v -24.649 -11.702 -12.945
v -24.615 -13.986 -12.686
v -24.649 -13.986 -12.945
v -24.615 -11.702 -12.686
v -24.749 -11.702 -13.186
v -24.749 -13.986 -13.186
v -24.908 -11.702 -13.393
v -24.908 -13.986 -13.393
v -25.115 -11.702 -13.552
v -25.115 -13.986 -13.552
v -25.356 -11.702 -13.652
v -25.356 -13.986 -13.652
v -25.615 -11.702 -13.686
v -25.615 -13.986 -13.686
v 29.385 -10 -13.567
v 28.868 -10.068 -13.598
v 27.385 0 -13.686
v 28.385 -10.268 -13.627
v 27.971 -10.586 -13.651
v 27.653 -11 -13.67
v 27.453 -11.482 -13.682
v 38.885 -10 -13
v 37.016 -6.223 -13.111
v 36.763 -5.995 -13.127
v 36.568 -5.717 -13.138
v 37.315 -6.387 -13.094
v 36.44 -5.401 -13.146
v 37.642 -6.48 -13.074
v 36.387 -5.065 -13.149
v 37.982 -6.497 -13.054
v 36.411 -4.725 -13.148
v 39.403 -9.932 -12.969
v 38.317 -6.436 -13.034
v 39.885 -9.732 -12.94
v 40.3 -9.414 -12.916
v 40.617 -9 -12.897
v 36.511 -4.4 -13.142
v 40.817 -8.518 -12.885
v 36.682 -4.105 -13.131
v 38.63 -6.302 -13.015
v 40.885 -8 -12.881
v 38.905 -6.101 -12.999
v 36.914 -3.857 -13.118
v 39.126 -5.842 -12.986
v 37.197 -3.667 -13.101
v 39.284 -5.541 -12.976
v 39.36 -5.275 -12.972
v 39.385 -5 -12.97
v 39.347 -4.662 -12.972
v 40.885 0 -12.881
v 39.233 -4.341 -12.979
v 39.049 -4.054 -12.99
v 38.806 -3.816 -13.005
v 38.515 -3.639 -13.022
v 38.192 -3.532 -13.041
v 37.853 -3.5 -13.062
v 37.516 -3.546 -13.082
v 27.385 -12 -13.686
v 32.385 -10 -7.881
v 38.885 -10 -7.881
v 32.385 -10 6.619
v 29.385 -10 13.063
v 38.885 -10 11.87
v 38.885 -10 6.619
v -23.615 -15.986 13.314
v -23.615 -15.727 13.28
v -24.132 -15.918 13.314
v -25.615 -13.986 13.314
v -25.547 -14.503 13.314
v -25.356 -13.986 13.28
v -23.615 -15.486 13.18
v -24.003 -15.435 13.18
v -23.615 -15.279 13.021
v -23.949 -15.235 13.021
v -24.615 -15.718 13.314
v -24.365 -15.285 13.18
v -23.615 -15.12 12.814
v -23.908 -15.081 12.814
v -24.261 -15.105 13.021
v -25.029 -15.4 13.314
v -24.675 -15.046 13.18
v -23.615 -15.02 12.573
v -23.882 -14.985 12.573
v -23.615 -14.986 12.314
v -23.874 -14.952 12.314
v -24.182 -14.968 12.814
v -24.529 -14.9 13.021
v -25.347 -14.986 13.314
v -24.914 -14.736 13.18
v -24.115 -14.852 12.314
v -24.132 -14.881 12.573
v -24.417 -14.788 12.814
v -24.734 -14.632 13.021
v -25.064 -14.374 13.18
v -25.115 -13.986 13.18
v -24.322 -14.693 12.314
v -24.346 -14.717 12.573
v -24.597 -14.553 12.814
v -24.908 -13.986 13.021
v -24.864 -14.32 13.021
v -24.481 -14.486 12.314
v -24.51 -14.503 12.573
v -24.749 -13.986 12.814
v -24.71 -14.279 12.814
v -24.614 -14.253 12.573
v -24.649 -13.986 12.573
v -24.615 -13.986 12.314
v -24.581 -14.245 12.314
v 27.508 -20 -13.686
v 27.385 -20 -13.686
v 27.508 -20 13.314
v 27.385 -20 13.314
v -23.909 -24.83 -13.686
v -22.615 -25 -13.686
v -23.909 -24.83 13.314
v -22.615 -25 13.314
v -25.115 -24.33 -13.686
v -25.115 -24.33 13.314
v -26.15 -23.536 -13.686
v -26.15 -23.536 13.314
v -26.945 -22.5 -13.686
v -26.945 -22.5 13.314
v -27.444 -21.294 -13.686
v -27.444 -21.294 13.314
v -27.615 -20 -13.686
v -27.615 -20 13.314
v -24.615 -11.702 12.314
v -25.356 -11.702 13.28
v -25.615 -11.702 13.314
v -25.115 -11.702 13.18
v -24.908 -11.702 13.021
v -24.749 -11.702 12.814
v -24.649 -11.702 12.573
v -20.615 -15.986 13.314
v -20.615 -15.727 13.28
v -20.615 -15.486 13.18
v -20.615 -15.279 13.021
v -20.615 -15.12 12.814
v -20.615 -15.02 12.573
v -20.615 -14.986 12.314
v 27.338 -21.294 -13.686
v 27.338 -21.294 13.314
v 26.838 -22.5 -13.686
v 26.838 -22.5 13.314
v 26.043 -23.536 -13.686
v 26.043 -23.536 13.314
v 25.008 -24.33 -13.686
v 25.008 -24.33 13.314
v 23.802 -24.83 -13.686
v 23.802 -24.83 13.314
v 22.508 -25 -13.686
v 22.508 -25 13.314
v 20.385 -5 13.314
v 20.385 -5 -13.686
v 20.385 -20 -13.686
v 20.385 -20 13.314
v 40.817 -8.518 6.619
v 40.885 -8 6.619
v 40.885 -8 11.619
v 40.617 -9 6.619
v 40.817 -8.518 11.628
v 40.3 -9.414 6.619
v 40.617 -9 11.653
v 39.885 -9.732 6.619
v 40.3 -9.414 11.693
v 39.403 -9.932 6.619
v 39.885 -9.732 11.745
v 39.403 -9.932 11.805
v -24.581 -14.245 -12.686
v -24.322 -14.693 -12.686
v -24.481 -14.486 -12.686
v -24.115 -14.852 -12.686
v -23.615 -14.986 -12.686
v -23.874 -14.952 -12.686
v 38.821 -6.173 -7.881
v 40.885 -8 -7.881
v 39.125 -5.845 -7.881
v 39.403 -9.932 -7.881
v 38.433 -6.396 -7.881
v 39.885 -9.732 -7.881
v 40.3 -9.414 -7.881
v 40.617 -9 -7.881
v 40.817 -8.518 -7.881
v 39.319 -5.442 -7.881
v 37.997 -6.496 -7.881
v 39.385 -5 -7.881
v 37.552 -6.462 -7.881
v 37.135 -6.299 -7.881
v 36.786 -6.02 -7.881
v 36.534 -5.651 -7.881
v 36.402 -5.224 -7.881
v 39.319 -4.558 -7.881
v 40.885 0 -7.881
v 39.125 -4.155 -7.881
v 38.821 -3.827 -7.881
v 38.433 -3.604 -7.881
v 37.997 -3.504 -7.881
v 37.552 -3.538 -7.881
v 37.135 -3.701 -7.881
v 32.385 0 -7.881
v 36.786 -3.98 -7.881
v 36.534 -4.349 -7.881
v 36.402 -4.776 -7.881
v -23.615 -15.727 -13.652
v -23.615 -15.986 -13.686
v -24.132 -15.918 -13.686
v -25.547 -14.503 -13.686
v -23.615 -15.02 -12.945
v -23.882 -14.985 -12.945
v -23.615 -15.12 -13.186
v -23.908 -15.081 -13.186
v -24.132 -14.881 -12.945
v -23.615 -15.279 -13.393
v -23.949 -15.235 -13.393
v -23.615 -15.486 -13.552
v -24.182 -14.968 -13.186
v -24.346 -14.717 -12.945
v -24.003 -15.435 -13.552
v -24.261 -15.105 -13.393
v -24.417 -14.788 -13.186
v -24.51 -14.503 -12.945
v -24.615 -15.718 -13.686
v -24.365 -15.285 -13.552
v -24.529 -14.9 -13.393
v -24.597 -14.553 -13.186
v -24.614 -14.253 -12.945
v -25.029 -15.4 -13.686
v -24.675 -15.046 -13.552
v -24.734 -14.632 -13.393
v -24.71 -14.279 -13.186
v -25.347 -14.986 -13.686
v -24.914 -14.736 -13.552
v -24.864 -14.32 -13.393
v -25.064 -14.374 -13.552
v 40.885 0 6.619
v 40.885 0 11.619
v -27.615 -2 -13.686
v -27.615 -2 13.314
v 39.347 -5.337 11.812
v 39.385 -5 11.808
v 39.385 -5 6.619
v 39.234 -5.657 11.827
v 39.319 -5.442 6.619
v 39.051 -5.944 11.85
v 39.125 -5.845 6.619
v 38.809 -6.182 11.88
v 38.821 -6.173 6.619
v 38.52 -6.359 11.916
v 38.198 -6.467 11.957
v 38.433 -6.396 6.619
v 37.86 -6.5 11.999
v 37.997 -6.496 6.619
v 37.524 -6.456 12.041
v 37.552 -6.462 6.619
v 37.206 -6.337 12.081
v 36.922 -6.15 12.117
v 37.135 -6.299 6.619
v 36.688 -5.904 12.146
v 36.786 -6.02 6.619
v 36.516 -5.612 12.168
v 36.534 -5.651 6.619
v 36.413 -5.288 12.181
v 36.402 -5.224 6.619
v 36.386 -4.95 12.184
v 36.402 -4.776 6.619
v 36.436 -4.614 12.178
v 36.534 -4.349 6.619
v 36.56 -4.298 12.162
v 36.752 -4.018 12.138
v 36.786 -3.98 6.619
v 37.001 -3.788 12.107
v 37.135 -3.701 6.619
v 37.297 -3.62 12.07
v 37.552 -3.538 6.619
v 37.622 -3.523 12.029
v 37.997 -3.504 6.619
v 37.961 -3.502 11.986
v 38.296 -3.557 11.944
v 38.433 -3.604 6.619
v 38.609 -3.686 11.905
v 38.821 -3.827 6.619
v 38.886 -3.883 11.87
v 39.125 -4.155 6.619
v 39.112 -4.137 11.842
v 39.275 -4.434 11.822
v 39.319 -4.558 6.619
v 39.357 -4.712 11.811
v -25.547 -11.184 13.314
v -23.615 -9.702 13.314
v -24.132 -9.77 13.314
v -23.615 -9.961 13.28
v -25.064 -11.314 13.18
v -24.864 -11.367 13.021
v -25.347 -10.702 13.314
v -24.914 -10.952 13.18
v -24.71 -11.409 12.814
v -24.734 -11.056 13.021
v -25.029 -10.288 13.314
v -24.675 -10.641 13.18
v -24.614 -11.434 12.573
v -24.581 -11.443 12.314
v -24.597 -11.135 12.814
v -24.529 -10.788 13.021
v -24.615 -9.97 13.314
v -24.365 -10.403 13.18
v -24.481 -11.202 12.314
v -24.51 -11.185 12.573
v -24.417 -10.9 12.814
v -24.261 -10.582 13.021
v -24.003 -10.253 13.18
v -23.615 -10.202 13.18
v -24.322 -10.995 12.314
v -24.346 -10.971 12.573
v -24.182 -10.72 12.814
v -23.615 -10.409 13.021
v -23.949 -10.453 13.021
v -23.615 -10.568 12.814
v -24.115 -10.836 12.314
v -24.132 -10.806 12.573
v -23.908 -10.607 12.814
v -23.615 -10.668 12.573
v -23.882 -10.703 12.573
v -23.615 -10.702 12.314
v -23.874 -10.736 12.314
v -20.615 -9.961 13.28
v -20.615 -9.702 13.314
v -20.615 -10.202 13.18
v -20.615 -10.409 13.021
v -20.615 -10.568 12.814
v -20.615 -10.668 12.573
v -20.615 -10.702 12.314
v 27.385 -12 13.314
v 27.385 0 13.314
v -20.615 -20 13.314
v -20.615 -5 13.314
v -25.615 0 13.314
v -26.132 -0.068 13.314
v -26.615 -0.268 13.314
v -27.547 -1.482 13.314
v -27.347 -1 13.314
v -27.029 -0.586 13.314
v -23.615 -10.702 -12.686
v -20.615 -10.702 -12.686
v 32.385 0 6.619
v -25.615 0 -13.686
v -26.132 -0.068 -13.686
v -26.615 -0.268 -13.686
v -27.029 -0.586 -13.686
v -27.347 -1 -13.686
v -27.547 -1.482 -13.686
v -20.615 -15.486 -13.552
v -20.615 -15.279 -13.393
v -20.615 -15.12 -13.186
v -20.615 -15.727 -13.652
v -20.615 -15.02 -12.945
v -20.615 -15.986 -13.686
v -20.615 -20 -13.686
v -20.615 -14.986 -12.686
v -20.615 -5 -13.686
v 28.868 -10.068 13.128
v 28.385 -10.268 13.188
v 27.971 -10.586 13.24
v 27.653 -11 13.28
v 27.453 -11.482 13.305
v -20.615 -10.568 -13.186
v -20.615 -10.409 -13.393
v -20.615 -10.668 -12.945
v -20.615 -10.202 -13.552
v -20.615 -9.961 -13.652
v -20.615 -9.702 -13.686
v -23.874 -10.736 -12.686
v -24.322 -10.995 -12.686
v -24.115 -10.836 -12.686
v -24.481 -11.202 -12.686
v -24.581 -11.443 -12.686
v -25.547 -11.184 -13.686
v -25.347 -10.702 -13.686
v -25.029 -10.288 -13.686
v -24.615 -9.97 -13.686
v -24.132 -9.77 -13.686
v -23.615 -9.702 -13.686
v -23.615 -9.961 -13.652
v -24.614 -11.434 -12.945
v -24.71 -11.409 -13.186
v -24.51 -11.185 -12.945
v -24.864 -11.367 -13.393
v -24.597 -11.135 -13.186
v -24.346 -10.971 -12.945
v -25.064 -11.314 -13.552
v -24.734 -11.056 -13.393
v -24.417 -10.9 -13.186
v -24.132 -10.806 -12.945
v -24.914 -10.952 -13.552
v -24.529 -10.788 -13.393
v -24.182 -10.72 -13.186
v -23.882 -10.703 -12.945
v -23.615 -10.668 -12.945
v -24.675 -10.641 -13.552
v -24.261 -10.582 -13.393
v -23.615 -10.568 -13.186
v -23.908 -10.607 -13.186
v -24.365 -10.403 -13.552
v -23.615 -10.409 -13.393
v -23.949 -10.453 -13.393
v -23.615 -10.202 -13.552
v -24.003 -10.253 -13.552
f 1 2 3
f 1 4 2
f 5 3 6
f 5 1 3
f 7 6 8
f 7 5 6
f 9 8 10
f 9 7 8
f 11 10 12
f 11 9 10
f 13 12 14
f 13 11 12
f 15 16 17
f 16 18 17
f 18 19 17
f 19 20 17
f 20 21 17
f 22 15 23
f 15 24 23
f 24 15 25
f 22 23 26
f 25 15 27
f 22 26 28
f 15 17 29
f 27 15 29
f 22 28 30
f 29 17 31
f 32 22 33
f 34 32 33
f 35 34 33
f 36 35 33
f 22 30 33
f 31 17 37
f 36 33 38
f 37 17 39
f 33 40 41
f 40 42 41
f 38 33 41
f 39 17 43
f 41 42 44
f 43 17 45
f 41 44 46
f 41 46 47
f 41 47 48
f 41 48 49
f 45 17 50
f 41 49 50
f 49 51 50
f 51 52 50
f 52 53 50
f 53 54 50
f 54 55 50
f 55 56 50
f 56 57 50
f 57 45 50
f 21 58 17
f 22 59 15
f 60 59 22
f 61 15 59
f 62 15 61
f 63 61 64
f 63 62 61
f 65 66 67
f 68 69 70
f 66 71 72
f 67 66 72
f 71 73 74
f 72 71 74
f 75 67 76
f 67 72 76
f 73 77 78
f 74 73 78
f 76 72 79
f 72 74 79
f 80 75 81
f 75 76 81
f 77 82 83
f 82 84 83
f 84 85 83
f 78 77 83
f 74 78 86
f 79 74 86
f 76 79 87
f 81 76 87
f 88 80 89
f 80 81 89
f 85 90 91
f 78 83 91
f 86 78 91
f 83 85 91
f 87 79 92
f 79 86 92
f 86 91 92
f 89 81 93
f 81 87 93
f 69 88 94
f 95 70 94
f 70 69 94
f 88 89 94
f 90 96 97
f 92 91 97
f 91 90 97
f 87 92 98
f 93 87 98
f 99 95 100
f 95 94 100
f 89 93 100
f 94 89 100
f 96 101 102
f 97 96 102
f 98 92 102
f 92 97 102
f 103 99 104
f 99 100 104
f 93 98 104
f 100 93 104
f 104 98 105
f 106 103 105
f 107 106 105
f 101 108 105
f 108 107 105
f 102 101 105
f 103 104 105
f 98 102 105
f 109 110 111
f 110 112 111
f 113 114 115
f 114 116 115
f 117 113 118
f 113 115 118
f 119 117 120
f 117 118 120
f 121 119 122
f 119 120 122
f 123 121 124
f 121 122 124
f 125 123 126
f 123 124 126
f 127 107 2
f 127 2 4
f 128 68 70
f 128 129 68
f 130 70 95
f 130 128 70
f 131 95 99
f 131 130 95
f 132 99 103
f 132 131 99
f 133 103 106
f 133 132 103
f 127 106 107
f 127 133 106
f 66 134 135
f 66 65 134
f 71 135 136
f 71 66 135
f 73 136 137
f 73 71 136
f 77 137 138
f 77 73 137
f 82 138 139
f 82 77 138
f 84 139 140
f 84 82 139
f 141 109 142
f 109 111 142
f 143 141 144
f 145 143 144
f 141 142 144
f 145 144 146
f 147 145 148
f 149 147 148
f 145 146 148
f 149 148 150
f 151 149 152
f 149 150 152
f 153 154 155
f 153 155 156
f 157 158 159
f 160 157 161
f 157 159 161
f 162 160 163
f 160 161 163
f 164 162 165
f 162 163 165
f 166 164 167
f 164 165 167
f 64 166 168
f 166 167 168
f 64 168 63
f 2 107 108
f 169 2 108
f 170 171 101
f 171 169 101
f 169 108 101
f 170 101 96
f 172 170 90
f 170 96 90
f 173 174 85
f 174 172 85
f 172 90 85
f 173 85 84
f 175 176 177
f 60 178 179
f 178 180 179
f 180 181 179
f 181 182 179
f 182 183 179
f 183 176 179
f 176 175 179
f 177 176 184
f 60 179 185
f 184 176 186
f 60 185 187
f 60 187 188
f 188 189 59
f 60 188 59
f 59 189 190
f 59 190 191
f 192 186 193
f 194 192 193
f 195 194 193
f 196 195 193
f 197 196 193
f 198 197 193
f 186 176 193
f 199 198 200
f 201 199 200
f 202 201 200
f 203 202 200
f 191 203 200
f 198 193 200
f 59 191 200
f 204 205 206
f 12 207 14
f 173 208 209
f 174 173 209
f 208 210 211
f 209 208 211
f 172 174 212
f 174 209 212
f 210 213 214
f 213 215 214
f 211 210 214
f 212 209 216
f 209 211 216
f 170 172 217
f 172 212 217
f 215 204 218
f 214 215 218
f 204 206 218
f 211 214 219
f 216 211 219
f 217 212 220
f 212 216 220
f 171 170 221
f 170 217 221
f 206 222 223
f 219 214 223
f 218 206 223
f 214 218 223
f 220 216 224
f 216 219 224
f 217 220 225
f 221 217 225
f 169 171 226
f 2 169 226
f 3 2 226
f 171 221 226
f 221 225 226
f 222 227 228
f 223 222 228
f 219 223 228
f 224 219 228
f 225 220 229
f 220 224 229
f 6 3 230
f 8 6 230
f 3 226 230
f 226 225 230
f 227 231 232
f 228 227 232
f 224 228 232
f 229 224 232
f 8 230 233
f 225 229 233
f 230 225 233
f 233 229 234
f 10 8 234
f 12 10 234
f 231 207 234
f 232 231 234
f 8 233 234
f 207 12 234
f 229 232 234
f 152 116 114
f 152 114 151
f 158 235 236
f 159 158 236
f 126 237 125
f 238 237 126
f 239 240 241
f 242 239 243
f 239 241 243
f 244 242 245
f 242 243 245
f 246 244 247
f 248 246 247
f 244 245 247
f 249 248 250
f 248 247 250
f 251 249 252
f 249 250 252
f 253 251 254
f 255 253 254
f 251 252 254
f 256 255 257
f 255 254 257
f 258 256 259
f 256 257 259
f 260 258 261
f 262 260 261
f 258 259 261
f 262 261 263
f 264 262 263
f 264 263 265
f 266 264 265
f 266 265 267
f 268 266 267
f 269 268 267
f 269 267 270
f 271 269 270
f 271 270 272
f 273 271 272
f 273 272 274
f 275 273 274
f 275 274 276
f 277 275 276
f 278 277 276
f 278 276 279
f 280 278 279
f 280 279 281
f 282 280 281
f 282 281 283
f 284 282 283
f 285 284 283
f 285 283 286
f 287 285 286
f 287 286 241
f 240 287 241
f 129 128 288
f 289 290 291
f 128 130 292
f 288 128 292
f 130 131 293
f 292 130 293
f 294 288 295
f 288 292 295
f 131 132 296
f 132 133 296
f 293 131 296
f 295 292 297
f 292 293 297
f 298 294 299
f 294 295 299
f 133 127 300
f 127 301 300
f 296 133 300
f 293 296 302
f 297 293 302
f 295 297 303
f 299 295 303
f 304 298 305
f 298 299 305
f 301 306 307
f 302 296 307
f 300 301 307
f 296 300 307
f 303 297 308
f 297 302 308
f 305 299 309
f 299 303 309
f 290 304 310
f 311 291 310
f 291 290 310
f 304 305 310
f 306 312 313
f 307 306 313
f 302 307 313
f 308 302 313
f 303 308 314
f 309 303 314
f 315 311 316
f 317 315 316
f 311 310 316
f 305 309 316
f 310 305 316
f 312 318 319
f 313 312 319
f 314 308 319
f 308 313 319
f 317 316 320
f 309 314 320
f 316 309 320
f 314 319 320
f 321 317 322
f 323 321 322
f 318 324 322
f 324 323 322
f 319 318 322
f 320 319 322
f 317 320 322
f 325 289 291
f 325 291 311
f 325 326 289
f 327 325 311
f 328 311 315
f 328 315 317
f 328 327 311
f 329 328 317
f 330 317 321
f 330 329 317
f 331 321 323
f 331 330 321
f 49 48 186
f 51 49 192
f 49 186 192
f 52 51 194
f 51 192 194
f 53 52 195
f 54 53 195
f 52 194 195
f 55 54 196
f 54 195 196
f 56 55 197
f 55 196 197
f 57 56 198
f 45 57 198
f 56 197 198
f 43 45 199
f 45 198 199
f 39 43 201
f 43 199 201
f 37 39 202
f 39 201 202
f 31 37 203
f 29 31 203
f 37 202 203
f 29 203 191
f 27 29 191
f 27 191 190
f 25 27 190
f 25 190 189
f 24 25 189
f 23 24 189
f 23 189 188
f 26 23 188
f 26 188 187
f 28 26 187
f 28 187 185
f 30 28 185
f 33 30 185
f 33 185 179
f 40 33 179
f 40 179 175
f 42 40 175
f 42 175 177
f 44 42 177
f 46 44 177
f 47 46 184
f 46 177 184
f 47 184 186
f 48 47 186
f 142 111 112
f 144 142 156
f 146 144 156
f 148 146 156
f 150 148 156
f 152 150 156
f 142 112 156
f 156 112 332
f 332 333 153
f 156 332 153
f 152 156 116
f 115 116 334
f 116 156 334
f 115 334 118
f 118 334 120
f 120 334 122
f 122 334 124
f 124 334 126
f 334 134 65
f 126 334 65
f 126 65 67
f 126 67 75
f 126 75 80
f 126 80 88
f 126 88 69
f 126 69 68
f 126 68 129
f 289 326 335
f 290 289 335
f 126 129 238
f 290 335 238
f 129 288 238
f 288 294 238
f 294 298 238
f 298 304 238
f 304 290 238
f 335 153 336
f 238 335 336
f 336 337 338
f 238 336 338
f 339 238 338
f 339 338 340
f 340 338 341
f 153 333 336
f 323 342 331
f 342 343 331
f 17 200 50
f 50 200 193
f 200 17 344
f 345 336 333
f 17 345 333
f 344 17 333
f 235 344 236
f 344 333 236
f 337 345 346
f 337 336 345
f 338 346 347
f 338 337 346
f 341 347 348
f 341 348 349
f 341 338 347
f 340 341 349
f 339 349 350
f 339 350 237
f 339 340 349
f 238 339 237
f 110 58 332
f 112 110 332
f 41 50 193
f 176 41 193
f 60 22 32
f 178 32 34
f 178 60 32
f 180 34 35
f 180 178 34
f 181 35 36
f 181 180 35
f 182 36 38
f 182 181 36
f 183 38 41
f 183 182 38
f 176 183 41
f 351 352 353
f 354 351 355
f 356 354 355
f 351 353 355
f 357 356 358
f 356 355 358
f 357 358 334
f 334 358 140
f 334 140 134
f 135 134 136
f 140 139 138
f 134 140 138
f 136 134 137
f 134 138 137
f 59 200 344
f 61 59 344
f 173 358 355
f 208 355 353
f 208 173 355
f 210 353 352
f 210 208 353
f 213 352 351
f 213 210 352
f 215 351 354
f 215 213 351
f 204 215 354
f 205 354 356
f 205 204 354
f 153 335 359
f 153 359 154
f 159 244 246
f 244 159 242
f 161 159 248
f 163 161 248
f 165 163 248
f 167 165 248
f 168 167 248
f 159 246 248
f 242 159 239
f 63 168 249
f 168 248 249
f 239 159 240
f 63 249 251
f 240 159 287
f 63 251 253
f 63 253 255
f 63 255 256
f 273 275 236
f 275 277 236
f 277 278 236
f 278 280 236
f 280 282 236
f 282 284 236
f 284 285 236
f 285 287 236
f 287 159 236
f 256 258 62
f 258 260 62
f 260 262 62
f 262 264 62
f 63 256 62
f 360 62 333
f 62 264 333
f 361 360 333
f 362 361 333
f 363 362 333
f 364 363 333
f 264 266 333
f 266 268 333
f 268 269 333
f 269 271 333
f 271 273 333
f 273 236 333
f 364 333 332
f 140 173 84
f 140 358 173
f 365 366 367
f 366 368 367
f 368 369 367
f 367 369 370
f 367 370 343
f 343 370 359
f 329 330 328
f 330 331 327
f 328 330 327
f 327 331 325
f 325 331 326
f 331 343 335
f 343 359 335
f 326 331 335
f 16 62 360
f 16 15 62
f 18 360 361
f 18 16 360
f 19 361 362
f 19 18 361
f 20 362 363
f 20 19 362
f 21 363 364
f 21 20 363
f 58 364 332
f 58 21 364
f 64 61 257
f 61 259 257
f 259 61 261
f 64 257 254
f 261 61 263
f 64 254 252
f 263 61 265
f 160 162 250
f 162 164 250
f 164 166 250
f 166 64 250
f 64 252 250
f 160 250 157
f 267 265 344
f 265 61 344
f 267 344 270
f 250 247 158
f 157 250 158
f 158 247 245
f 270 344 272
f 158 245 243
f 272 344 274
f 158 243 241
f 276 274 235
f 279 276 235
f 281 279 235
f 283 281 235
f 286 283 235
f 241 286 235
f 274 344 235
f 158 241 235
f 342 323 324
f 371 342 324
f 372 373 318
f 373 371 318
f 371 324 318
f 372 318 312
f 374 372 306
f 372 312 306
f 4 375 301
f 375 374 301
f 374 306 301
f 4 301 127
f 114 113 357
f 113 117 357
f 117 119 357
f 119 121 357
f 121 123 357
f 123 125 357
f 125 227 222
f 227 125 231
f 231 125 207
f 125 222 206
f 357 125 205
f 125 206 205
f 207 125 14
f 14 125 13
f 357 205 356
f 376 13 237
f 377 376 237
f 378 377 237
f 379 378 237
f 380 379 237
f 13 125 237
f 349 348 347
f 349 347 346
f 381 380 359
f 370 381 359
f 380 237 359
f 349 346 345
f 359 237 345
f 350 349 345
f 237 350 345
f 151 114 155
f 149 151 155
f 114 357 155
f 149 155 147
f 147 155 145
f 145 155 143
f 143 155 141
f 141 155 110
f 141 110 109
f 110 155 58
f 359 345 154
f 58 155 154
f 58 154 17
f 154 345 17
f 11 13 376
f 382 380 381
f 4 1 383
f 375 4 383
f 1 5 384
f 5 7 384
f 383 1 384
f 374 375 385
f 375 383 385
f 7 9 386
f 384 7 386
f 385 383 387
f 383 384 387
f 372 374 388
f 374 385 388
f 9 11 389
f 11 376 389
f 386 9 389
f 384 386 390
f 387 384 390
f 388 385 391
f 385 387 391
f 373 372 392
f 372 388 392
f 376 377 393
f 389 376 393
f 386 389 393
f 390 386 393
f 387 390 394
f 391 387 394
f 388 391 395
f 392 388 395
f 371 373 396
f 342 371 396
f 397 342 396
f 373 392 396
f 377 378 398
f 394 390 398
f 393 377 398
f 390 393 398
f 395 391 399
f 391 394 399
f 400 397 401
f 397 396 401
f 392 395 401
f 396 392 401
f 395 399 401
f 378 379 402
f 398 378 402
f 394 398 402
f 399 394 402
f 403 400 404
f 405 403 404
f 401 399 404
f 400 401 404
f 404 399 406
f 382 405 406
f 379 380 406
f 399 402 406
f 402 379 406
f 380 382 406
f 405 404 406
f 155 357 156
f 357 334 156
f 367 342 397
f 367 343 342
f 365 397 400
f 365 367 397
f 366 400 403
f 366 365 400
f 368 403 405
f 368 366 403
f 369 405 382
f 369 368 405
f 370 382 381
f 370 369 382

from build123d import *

# Parameters (mm, degrees)
F0_W           = 41
F0_H           = 27
F1_DEPTH       = 5
F0_W_2         = 7
F2_DEPTH       = 20
F3_DEPTH       = 20
F4_DEPTH       = 10
F5_R           = 2
F8_D           = 3
F8_DEPTH       = 12
F8_TIP         = 0.9012909285
F8_ON_F6_D     = 3
F8_ON_F6_DEPTH = 12
F8_ON_F6_TIP   = 0.9012909285
F9_W           = 48.1226687921
F9_H           = 27
F9_W_2         = 55.1226687921
F10_DEPTH      = 5
F11_R          = 4.99999
F12_W          = 4.2837616056
F12_H          = 27.1169293898
F13_DEPTH      = 4
F14_F1_R       = 1
F14_F2_R       = 1
F15_R          = 1


# Not quite as in the source:
# - a fillet or chamfer is up to 0.001 mm smaller than in the source, because OpenCascade refuses the exact size


with BuildPart() as f1:
    # F0 (on Front) → F1 (new body)
    with BuildSketch(Plane.XZ):
        with Locations((-0.1147079957, -0.1861773429)):
            Rectangle(F0_W, F0_H)
    extrude(amount=F1_DEPTH)

    # F0 (on Front) → F2 (join)
    with BuildSketch(Plane.XZ):
        with Locations((23.8852920043, -0.1861773429)):
            Rectangle(F0_W_2, F0_H)
    extrude(amount=F2_DEPTH)

    # F0 (on Front) → F3 (join)
    with BuildSketch(Plane.XZ):
        with Locations((-24.1147079957, -0.1861773429)):
            Rectangle(F0_W_2, F0_H)
    extrude(amount=F3_DEPTH)

    # F0 (on Front) → F4 (join)
    with BuildSketch(Plane.XZ):
        Polygon((40.8852920043, 11.6193783459), (27.3852920043, 13.3138226571), (27.3852920043, -13.6861773429), (40.8852920043, -12.8806216541), (40.8852920043, -7.8806216541), (32.3852920043, -7.8806216541), (32.3852920043, 6.6193783459), (40.8852920043, 6.6193783459), align=None)
    extrude(amount=F4_DEPTH)

    # F5
    f5_edges = [f1.edges().sort_by_distance(p)[0] for p in [
        (27.385292, -10, -0.186177),
        (-27.614708, 0, -0.186177),
        (40.885292, -10, -10.380622),
        (40.885292, -10, 9.119378),
    ]]
    fillet(f5_edges, radius=F5_R)

    # F8 (one way)
    with BuildSketch(Plane(origin=(0, 0, 6.6193783459), x_dir=(1, 0, 0), z_dir=(0, 0, -1))):
        with Locations((37.8852920043, 5)):
            Circle(F8_D / 2)
    extrude(amount=-F8_DEPTH, mode=Mode.SUBTRACT)
    with Locations(Plane(origin=(0, 0, 6.6193783459), x_dir=(1, 0, 0), z_dir=(0, 0, -1))):
        with Locations((37.8852920043, 5)):
            with Locations((0, 0, -(F8_DEPTH + F8_TIP / 2))):  # 118° drill point
                Cone(0, F8_D / 2, F8_TIP, mode=Mode.SUBTRACT)

    # F8 on F6 (one way)
    with BuildSketch(Plane.XY.offset(-7.8806216541)):
        with Locations((37.8852920043, -5)):
            Circle(F8_ON_F6_D / 2)
    extrude(amount=-F8_ON_F6_DEPTH, mode=Mode.SUBTRACT)
    with Locations(Plane.XY.offset(-7.8806216541)):
        with Locations((37.8852920043, -5)):
            with Locations((0, 0, -(F8_ON_F6_DEPTH + F8_ON_F6_TIP / 2))):  # 118° drill point
                Cone(0, F8_ON_F6_D / 2, F8_ON_F6_TIP, mode=Mode.SUBTRACT)

    # F9 (on face) → F10 (join)
    with BuildSketch(Plane.XZ.offset(20)):
        with Locations((3.4466264003, -0.1861773429)):
            Rectangle(F9_W, F9_H)
        with Locations((-0.0533735997, -0.1861773429)):
            Rectangle(F9_W_2, F9_H)
    extrude(amount=F10_DEPTH)

    # F11 (radius 5 in the source; OpenCascade refuses exactly that, so slightly less here)
    f11_edges = [f1.edges().sort_by_distance(p)[0] for p in [
        (27.507961, -25, -0.186177),
        (-27.614708, -25, -0.186177),
    ]]
    fillet(f11_edges, radius=F11_R)

    # F12 (on face) → F13 (cut)
    with BuildSketch(Plane.YZ.offset(-20.6147079957)):
        with Locations((-12.8439003602, -0.2446420378)):
            Rectangle(F12_W, F12_H)
    extrude(amount=-F13_DEPTH, mode=Mode.SUBTRACT)

    # F14: fillet of radius 1 on 3 edges, made by hand

    # F14_f1
    f14_f1_edges = [f1.edges().sort_by_distance(p)[0] for p in [
        (-24.6147079957, -14.985781163, -0.1861773429),
        (-24.6147079957, -10.7020195574, -0.1861773429),
    ]]
    fillet(f14_f1_edges, radius=F14_F1_R)

    # F14_f2
    f14_f2_edges = [f1.edges().sort_by_distance(p)[0] for p in [
        (-24.6147079957, -12.8439003602, 13.3138226571),
        (-24.3218147769, -10.9949127762, 13.3138226571),
        (-24.3218147769, -14.6928879442, 13.3138226571),
    ]]
    fillet(f14_f2_edges, radius=F14_F2_R)

    # F15
    f15_edges = [f1.edges().sort_by_distance(p)[0] for p in [
        (-22.114708, -14.985781, -13.686177),
        (-22.114708, -10.70202, -13.686177),
        (-24.321815, -10.994913, -13.686177),
        (-24.614708, -12.8439, -13.686177),
        (-24.321815, -14.692888, -13.686177),
    ]]
    fillet(f15_edges, radius=F15_R)


solid = f1.part
